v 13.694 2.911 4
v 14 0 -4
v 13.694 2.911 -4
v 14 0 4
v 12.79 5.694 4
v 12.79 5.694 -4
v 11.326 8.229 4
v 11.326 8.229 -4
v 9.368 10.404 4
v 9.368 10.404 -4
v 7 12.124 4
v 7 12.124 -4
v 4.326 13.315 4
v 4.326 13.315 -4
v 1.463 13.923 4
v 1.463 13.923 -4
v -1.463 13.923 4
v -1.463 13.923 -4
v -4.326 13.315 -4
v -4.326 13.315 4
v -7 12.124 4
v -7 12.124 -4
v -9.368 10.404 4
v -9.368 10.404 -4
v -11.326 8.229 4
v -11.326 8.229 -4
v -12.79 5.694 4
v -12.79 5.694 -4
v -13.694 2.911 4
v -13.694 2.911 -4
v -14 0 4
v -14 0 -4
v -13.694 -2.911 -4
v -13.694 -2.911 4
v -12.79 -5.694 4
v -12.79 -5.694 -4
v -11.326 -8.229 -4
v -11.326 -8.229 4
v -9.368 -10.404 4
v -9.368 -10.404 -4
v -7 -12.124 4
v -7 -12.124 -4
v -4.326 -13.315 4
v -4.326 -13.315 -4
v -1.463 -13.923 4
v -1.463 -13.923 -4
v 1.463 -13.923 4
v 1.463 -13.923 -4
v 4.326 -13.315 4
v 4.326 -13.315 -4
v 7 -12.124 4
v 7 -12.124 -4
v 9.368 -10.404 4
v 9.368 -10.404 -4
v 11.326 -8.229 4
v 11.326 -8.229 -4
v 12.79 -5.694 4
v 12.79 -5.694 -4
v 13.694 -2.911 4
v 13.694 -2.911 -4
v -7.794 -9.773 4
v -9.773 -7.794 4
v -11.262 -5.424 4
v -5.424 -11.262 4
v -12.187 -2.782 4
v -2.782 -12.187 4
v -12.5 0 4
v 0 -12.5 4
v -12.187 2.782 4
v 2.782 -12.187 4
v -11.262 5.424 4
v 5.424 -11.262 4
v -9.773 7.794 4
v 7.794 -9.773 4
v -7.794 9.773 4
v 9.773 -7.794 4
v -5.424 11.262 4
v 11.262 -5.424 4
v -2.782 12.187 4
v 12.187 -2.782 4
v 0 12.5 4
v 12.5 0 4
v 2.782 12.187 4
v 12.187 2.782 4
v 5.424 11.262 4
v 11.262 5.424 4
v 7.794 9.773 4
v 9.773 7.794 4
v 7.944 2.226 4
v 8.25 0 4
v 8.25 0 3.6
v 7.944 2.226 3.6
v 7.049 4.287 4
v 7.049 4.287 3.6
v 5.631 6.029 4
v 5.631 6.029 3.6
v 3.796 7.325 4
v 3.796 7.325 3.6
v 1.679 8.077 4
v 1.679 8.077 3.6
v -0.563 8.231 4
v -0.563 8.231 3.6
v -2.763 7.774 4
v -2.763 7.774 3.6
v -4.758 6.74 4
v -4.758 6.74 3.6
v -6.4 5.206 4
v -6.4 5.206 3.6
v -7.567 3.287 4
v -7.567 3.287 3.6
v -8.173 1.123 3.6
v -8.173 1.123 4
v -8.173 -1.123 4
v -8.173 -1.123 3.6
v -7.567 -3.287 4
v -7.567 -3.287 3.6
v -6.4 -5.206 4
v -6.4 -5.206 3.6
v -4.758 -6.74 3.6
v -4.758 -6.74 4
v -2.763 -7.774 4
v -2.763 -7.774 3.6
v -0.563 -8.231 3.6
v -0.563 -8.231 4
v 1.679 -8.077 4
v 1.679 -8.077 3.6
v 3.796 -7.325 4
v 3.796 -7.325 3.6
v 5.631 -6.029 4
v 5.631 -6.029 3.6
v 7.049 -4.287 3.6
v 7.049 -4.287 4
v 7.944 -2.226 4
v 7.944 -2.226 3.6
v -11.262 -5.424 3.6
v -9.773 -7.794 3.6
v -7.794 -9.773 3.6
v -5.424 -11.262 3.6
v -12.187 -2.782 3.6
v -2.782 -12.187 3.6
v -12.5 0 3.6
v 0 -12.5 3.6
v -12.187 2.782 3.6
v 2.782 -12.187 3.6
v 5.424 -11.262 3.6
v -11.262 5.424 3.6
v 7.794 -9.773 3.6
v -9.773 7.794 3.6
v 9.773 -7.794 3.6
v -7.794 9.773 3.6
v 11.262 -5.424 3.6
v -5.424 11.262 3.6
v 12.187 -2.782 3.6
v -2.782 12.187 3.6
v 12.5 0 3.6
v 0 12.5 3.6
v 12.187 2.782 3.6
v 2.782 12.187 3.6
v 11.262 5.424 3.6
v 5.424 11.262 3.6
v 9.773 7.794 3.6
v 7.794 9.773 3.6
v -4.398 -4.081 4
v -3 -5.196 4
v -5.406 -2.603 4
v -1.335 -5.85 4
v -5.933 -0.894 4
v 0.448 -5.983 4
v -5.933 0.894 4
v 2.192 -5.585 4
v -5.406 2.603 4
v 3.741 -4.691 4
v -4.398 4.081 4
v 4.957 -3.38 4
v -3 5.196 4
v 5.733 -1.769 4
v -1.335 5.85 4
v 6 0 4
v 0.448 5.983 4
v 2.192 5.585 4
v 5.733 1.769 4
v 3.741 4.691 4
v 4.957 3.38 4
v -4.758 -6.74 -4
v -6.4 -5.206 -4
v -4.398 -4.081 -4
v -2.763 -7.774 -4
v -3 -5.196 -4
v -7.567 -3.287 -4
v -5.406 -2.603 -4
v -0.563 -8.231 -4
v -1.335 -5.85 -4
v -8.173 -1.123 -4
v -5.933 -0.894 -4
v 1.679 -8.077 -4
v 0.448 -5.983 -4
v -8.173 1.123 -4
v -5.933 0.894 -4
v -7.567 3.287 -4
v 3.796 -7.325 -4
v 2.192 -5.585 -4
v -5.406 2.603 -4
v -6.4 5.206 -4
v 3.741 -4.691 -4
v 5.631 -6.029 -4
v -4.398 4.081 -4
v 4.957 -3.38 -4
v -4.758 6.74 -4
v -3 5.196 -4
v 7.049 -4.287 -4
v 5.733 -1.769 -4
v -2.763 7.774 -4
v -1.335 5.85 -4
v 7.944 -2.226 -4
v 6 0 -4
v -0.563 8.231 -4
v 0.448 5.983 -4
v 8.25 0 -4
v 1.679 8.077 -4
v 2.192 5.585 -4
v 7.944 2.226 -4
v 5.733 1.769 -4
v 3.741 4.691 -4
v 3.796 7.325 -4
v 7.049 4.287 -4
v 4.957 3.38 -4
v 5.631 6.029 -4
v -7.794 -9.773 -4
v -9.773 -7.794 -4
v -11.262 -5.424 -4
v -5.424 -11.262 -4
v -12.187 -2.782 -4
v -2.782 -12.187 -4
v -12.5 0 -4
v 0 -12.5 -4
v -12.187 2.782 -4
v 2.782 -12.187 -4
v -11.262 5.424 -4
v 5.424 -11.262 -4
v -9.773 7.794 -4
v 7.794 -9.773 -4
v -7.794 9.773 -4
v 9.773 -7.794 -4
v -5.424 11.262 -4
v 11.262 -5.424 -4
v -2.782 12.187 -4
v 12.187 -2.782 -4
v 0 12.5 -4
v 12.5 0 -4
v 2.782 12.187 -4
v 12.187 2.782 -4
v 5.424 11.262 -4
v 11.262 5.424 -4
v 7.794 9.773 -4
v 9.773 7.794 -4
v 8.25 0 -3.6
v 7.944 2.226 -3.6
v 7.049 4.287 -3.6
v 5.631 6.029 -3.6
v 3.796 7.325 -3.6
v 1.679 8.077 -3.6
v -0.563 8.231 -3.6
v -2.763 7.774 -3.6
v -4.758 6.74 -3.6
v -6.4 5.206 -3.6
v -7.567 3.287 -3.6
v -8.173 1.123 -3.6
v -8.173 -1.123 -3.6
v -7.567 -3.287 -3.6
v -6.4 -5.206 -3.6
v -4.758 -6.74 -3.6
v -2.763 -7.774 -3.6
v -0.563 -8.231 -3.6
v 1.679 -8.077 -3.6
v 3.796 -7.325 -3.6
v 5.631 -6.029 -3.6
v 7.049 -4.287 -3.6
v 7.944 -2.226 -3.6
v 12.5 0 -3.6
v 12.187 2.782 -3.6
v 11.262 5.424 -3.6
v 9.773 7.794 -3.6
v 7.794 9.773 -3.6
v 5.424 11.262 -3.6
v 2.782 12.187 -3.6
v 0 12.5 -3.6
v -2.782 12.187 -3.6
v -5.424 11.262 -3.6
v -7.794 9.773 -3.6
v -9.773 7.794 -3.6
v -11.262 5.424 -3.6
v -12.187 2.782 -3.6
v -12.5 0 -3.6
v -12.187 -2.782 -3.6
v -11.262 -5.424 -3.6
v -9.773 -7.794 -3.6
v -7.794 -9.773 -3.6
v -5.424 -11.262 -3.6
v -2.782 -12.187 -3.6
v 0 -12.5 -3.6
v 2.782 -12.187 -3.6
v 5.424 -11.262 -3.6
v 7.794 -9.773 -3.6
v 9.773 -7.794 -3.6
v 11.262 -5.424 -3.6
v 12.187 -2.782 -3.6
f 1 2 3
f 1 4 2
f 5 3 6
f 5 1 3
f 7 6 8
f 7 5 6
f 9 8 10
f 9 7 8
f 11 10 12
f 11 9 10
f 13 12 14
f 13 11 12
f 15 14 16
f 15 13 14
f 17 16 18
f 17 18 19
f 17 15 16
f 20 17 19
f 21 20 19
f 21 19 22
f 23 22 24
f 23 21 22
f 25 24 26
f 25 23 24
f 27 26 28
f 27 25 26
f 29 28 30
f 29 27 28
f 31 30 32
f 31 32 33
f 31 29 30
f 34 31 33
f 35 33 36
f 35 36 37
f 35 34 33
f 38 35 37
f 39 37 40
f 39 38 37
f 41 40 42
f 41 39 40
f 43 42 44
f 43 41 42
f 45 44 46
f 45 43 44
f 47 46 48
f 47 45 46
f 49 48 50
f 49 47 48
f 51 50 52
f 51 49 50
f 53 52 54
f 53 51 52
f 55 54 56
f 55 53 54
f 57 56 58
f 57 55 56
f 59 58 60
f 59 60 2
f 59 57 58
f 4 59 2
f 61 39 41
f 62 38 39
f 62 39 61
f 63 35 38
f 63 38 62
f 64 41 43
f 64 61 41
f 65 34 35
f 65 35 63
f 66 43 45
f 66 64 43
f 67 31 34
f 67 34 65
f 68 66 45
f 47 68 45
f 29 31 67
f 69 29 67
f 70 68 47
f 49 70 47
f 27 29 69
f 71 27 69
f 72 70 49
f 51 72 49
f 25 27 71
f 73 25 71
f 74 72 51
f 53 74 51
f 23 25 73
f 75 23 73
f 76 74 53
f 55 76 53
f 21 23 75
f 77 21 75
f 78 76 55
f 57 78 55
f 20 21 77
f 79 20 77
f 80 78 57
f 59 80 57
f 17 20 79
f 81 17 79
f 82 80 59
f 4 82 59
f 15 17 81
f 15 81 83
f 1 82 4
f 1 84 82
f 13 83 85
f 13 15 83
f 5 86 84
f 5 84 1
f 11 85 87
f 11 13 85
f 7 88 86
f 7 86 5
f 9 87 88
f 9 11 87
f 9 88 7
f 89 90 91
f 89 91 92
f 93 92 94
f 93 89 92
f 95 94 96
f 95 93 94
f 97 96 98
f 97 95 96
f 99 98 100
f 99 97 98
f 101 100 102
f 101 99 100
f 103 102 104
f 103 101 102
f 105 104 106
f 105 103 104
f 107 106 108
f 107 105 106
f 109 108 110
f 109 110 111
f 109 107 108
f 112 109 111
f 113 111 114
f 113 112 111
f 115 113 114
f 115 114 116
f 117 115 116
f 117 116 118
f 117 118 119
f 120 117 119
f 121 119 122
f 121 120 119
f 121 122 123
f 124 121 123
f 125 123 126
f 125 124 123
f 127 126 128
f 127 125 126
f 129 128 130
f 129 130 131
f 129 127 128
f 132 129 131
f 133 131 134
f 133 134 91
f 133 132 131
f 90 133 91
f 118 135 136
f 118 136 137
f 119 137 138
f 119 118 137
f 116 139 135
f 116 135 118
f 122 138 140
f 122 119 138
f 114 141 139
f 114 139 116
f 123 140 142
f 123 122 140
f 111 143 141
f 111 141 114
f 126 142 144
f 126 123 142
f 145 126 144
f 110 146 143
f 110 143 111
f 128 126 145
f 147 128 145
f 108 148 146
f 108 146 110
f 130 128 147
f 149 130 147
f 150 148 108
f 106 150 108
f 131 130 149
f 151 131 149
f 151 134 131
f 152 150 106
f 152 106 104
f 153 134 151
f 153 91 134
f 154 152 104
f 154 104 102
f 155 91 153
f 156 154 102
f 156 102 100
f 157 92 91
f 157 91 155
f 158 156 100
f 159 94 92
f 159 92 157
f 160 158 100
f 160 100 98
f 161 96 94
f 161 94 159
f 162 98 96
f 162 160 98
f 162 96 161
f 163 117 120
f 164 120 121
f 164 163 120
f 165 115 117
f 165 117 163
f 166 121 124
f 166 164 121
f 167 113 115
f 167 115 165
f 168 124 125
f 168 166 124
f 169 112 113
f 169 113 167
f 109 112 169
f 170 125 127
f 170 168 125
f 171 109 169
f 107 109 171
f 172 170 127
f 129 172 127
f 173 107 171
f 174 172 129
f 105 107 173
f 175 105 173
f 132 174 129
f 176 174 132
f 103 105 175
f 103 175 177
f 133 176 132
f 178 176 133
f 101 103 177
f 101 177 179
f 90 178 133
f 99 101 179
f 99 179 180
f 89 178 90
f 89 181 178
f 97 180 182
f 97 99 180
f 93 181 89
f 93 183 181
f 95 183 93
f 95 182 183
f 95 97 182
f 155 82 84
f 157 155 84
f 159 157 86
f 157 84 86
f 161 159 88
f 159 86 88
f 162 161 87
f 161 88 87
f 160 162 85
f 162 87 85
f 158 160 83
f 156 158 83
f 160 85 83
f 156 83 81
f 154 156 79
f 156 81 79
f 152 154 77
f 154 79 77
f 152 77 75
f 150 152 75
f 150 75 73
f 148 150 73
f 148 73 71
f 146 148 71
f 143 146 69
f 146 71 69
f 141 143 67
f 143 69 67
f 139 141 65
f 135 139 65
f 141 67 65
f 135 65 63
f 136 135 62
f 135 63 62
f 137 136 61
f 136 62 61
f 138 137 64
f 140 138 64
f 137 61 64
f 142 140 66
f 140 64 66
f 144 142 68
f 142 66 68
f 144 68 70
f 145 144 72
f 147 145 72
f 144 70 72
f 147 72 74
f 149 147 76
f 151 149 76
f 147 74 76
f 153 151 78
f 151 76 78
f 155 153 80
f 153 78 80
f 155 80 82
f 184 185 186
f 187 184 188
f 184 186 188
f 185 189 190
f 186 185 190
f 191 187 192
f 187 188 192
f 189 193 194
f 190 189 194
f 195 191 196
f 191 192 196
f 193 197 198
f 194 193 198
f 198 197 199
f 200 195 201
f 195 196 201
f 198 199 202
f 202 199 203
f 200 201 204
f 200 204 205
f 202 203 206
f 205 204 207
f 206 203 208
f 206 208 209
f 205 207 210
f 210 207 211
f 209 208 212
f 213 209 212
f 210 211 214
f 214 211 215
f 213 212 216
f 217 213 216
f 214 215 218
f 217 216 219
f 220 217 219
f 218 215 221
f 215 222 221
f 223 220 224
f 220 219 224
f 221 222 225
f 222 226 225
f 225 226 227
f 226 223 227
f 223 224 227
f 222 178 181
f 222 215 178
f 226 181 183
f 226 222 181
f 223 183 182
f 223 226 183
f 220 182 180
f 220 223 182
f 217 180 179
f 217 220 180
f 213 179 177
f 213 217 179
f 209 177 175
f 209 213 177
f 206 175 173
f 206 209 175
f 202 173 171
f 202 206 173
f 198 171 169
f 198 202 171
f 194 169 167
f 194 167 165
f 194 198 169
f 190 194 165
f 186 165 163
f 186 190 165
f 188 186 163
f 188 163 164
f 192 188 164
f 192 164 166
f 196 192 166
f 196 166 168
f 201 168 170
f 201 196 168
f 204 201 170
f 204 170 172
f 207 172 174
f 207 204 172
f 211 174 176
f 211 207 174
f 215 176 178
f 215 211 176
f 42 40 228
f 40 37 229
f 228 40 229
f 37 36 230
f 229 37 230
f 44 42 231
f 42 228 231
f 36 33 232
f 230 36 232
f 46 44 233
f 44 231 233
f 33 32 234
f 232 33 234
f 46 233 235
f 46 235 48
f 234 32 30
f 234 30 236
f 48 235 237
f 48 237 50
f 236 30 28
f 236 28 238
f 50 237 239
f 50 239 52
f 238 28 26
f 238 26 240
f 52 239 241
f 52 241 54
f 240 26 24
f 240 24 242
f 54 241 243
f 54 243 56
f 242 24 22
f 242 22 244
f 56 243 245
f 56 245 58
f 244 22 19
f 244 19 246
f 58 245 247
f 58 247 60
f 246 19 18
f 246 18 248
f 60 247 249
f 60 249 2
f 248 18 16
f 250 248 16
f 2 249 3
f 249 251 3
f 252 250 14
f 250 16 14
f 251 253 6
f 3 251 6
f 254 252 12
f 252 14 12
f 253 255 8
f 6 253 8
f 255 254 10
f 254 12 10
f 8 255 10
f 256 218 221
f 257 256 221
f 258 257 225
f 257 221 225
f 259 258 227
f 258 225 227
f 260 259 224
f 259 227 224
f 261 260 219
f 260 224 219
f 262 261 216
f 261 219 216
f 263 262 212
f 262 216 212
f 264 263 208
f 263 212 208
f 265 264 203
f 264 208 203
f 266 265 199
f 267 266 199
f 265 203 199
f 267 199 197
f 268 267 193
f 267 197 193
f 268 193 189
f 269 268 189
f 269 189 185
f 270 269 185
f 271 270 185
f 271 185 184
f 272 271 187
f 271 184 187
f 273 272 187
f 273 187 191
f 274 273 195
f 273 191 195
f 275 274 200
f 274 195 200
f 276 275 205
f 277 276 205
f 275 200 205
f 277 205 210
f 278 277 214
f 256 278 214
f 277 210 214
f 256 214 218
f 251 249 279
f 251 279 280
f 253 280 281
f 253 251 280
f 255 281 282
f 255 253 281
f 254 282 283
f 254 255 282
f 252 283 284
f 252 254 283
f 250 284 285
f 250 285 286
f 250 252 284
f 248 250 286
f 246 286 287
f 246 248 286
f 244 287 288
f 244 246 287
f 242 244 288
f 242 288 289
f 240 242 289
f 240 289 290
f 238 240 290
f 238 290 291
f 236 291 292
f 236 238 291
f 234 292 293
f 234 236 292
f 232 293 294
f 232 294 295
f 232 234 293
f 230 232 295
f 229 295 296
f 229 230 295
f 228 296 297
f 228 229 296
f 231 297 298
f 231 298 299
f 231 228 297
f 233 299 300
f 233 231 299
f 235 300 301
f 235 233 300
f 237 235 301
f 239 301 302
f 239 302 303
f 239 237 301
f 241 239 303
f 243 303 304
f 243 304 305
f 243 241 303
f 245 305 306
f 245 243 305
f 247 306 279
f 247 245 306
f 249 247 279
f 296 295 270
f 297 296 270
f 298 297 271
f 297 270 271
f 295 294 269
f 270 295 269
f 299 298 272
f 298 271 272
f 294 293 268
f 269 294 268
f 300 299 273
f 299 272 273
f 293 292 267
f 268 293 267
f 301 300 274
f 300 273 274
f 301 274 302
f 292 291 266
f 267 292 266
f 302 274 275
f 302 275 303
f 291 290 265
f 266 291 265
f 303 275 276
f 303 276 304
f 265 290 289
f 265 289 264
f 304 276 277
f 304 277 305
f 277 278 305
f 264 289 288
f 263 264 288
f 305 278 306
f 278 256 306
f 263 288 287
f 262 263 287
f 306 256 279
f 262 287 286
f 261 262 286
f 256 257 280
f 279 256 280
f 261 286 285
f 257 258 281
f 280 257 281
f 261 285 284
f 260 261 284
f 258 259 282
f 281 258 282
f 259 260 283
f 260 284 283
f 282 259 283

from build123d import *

# Parameters (mm, degrees)
SKETCH1_R          = 14
SKETCH1_R_2        = 6
EXTRUDE1_DEPTH     = 4
SKETCH2_R          = 12.5
SKETCH2_R_2        = 8.25
CUT_EXTRUDE1_DEPTH = 0.4


with BuildPart() as part:
    # Sketch1 → Extrude1 (new, symmetric)
    with BuildSketch(Plane.XY):
        Circle(SKETCH1_R)
        Circle(SKETCH1_R_2, mode=Mode.SUBTRACT)
    extrude(amount=EXTRUDE1_DEPTH, both=True)

    # Sketch2 → Cut-Extrude1 (cut)
    with BuildSketch(Plane.XY.offset(4)):
        Circle(SKETCH2_R)
        Circle(SKETCH2_R_2, mode=Mode.SUBTRACT)
    cut_extrude1 = extrude(amount=-CUT_EXTRUDE1_DEPTH, mode=Mode.SUBTRACT)

    # Mirror1: Cut-Extrude1 across plane
    add(cut_extrude1.mirror(Plane.XY), mode=Mode.SUBTRACT)


solid = part.part
